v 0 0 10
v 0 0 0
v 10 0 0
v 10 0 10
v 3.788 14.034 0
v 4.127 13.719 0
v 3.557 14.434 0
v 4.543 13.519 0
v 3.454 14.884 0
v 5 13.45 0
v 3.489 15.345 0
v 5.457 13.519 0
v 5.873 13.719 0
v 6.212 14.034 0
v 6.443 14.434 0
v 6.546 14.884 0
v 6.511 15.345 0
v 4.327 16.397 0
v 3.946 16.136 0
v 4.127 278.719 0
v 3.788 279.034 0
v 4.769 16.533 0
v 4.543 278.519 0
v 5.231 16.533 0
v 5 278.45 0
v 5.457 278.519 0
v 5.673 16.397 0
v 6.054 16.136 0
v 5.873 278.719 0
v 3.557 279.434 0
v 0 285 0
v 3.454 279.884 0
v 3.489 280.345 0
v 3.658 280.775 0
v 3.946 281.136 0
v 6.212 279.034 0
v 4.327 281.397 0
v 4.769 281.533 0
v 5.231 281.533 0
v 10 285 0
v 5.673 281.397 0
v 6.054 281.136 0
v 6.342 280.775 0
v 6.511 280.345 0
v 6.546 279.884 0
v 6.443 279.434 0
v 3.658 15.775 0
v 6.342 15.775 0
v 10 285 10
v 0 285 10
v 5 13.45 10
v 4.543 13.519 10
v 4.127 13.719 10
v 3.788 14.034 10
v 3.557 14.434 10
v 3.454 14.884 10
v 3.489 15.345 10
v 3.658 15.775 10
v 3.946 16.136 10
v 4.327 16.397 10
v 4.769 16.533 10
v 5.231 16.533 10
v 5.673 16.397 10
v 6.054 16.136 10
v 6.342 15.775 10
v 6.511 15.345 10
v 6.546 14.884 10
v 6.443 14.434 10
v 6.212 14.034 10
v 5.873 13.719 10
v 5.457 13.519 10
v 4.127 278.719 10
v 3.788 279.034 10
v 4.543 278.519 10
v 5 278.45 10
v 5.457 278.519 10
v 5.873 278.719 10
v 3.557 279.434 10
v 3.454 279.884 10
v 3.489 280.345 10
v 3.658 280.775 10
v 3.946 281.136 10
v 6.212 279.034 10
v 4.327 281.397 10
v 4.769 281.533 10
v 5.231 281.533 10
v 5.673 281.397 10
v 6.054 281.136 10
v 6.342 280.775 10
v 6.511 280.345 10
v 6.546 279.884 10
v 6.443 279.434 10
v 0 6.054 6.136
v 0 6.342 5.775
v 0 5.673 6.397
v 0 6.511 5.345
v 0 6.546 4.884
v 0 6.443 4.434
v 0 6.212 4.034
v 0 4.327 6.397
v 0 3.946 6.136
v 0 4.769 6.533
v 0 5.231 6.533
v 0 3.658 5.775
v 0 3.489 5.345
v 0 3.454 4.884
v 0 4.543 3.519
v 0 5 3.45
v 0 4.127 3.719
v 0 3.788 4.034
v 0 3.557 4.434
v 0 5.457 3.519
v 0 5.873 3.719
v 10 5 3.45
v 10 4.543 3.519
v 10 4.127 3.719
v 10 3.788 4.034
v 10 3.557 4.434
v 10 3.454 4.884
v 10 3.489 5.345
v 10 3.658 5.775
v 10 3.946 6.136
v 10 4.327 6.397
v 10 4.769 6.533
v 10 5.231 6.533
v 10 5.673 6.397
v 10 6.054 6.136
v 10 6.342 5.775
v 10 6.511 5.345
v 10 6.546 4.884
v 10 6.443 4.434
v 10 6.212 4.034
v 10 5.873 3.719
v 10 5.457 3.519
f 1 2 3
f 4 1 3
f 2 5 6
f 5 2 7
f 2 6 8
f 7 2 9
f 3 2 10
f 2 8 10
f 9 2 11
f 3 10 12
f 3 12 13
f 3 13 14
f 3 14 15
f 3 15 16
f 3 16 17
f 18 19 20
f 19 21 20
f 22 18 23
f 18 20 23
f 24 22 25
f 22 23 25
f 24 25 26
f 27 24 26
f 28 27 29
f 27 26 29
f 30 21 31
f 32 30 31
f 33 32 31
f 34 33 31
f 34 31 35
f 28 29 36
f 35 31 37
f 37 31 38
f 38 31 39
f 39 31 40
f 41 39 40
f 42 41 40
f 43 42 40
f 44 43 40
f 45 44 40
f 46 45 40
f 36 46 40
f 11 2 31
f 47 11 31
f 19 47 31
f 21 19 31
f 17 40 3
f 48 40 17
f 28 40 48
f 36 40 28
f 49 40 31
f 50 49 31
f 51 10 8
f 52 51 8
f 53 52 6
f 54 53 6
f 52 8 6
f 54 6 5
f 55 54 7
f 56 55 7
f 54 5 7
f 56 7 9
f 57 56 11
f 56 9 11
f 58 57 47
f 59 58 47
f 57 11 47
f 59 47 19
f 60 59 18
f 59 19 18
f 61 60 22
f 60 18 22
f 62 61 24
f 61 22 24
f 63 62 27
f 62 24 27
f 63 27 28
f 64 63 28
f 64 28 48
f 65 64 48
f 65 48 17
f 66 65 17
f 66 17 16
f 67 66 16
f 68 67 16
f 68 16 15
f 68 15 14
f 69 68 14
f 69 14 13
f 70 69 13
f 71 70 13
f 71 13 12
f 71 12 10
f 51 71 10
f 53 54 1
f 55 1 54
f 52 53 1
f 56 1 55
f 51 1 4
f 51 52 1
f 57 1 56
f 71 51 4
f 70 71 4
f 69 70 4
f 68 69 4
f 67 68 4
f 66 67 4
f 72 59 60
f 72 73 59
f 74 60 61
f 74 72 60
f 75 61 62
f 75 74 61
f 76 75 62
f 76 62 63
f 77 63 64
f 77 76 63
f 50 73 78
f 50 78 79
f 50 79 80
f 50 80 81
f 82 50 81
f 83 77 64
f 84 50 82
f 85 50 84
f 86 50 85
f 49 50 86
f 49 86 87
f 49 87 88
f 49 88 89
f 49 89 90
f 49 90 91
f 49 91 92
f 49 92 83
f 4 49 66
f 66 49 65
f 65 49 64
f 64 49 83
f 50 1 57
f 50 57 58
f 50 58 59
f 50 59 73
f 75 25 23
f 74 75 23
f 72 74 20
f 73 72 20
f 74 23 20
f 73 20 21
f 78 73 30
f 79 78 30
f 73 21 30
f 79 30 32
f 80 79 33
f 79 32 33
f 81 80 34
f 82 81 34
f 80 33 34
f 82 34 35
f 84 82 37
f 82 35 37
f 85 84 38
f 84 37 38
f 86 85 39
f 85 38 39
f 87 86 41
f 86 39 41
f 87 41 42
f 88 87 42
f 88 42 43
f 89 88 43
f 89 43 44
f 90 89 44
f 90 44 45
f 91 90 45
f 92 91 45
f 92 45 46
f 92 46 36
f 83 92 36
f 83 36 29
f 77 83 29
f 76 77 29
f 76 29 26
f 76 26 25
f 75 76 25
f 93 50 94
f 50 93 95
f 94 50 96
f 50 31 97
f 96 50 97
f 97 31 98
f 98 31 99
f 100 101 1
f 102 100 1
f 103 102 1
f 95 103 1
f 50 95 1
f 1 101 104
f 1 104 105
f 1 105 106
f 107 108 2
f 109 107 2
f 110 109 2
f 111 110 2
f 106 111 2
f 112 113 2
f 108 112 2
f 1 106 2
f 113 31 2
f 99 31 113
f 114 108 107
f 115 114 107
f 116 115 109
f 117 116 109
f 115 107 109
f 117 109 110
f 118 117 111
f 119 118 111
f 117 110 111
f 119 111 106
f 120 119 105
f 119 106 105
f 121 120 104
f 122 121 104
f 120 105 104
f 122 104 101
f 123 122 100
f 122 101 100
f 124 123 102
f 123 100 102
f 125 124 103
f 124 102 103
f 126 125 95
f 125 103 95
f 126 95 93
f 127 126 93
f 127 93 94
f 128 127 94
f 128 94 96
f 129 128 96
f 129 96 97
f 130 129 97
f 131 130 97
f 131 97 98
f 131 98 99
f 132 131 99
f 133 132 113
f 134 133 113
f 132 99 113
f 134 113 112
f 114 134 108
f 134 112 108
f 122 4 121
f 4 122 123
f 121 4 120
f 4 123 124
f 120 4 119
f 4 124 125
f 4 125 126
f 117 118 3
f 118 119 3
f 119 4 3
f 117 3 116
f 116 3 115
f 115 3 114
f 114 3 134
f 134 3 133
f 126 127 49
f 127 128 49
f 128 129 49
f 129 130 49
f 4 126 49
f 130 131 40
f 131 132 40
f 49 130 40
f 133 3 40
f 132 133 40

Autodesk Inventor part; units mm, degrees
ref_plane "YZ Plane" through (0, 0, 0) normal (1, 0, 0) x (0, 1, 0)
ref_plane "XZ Plane" through (0, 0, 0) normal (0, 1, 0) x (-1, 0, 0)
ref_plane "XY Plane" through (0, 0, 0) normal (0, 0, 1) x (1, 0, 0)
sketch "スケッチ1" plane through (0, 0, 0) normal (0, 0, 1) x (1, 0, 0)
  line L0 (0, 0) -> (10, 0)
  line L1 (10, 0) -> (10, 285)
  line L2 (10, 285) -> (0, 285)
  line L3 (0, 285) -> (0, 0)
  dimension "d0" = 10
  dimension "d1" = 285
extrude "押し出し1" add sketch "スケッチ1" along normal blind 10
sketch "スケッチ2" plane through (10, 0, 0) normal (1, 0, 0) x (0, 0, -1)
  line L0 (0, 0) -> (-10, 0) projected
  line L1 (0, 285) -> (-10, 285) projected
  point P0 (-5, 5)
  point P1 (-5, 0)
  point P2 (-5, 0)
  point P3 (-5, 0)
  point P4 (-5, 285)
  dimension "d4" = 5
hole "穴1" at (10, 5, 5) direction (-1, 0, 0) diameter 3.1 end through all
sketch "スケッチ3" plane through (0, 0, 10) normal (0, 0, 1) x (1, 0, 0)
  line L0 (0, 0) -> (10, 0) projected
  line L1 (10, 285) -> (0, 285) projected
  point P0 (5, 15)
  point P1 (5, 280)
  point P2 (5, 0)
  point P3 (5, 0)
  point P4 (5, 0)
  point P5 (5, 285)
  dimension "d13" = 15
  dimension "d14" = 5
hole "穴2" at (5, 15, 10) at (5, 280, 10) direction (0, 0, -1) diameter 3.1 end through all
properties part number "Tate"
